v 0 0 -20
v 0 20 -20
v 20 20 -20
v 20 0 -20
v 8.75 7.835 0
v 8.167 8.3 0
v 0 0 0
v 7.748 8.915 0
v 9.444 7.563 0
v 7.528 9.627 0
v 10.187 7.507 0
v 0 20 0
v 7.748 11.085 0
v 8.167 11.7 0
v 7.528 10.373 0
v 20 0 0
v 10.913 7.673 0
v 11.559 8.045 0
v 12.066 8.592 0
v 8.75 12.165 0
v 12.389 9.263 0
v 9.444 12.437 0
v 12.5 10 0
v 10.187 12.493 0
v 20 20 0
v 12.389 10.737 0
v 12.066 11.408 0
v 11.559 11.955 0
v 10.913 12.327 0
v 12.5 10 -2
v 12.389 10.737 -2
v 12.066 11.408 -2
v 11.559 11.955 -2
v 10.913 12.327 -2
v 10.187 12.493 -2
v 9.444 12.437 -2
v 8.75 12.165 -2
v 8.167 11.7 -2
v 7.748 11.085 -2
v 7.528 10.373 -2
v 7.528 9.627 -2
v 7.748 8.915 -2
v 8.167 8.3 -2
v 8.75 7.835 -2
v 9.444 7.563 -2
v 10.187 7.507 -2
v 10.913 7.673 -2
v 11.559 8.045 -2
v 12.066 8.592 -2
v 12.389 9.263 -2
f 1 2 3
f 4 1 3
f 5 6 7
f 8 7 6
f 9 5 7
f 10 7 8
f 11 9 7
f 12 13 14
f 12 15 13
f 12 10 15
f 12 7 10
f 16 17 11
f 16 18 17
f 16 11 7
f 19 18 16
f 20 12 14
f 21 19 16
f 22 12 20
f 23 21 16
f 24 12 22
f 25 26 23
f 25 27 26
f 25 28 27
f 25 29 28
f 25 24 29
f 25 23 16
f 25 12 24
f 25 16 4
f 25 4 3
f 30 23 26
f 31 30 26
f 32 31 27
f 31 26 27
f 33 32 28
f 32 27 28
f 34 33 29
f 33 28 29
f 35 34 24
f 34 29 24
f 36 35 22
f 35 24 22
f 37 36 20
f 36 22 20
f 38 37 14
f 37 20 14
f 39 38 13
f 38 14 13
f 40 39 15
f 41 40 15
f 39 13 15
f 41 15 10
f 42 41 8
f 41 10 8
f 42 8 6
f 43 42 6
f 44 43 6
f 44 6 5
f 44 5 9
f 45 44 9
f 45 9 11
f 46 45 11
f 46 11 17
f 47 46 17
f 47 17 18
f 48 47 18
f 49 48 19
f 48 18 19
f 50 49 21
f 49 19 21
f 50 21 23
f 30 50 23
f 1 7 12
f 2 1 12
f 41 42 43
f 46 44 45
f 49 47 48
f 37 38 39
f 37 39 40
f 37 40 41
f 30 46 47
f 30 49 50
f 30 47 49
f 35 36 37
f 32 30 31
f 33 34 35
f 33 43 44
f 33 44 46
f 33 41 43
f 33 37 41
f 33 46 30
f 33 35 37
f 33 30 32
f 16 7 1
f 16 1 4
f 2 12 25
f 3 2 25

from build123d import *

# Parameters (mm, degrees)
ESQUISSE1_W             = 20
ESQUISSE1_H             = 20
BOSS_EXTRU_1_DEPTH      = 20
ESQUISSE2_R             = 2.5
ENL_V_MAT_EXTRU_1_DEPTH = 2


with BuildPart() as part:
    # Esquisse1 → Boss.-Extru.1 (new body)
    with BuildSketch(Plane.XY):
        with Locations((10, 10)):
            Rectangle(ESQUISSE1_W, ESQUISSE1_H)
    extrude(amount=-BOSS_EXTRU_1_DEPTH)

    # Esquisse2 → Enlèv. mat.-Extru.1 (cut)
    with BuildSketch(Plane.XY):
        with Locations((10, 10)):
            Circle(ESQUISSE2_R)
    extrude(amount=-ENL_V_MAT_EXTRU_1_DEPTH, mode=Mode.SUBTRACT)


solid = part.part
